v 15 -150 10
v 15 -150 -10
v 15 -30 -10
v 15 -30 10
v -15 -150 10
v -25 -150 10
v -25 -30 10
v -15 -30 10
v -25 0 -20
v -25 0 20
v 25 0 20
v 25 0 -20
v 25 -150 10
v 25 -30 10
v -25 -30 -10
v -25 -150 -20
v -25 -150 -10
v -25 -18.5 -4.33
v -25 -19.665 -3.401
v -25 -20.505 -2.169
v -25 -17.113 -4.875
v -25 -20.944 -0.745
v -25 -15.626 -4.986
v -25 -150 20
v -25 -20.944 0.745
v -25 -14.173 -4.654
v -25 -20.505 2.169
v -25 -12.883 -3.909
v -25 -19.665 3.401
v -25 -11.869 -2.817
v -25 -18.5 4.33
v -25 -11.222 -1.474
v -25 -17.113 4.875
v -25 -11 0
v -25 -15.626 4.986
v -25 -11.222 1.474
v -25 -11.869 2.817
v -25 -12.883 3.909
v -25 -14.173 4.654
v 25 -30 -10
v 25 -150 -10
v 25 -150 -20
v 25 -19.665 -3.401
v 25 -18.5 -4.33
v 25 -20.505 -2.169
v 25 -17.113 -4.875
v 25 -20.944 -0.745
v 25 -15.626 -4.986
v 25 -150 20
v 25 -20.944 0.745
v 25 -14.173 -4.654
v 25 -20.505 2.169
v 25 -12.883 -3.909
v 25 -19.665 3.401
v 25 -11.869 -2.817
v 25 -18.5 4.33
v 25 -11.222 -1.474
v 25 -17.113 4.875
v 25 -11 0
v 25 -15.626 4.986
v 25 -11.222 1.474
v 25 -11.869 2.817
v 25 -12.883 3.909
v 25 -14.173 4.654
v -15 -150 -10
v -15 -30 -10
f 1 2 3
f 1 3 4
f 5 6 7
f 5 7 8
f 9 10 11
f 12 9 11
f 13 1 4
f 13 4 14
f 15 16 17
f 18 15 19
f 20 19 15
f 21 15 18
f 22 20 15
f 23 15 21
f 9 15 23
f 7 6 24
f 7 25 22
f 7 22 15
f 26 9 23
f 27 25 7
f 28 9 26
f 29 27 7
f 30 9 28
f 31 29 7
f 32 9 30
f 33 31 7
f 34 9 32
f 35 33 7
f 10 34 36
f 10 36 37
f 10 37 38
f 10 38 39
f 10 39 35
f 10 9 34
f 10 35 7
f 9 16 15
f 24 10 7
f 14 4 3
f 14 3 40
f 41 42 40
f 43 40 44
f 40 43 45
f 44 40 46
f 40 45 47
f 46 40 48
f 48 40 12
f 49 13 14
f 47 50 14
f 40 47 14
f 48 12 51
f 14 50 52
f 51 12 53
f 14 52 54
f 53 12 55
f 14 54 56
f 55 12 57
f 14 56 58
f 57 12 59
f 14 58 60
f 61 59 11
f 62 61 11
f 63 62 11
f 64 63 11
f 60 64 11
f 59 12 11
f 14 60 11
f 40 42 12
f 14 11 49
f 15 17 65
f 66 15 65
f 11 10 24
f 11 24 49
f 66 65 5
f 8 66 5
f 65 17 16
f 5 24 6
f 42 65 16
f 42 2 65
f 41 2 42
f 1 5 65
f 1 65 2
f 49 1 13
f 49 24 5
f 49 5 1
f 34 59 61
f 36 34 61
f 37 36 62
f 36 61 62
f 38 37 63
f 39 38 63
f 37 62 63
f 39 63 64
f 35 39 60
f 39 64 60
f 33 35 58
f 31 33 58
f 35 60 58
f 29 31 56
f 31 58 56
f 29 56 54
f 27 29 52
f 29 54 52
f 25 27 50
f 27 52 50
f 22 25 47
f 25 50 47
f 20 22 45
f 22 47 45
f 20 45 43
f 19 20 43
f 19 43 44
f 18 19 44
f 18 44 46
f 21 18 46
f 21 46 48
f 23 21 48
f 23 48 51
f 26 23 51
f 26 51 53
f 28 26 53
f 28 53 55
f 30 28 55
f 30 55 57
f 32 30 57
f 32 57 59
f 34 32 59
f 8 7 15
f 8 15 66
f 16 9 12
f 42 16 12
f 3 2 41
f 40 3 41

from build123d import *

# Parameters (mm, degrees)
F0_W     = 50
F0_H     = 40
F1_DEPTH = 150
F2_R     = 5
F3_DEPTH = 104
F5_W     = 15
F5_H     = 20
F6_DEPTH = 120


with BuildPart() as f1:
    # F0 (on Front) → F1 (new body)
    with BuildSketch(Plane.XZ):
        Rectangle(F0_W, F0_H)
    extrude(amount=F1_DEPTH)


with BuildPart() as f3:
    # F2 (on face) → F3 (new body)
    with BuildSketch(Plane.YZ.offset(25)):
        with Locations((-16, 0)):
            Circle(F2_R)
    extrude(amount=-F3_DEPTH)


with BuildPart() as f1_1:
    add(f1.part)

    # F4: cut F3
    add(f3.part, mode=Mode.SUBTRACT)


with BuildPart() as f6:
    # F5 (on face) → F6 (new body)
    with BuildSketch(Plane.XZ.offset(150)):
        with Locations((-22.5, 0)):
            Rectangle(F5_W, F5_H)
        with Locations((22.5, 0)):
            Rectangle(F5_W, F5_H)
    extrude(amount=-F6_DEPTH)


with BuildPart() as f1_2:
    add(f1_1.part)

    # F7: cut F6
    add(f6.part, mode=Mode.SUBTRACT)


solid = f1_2.part
